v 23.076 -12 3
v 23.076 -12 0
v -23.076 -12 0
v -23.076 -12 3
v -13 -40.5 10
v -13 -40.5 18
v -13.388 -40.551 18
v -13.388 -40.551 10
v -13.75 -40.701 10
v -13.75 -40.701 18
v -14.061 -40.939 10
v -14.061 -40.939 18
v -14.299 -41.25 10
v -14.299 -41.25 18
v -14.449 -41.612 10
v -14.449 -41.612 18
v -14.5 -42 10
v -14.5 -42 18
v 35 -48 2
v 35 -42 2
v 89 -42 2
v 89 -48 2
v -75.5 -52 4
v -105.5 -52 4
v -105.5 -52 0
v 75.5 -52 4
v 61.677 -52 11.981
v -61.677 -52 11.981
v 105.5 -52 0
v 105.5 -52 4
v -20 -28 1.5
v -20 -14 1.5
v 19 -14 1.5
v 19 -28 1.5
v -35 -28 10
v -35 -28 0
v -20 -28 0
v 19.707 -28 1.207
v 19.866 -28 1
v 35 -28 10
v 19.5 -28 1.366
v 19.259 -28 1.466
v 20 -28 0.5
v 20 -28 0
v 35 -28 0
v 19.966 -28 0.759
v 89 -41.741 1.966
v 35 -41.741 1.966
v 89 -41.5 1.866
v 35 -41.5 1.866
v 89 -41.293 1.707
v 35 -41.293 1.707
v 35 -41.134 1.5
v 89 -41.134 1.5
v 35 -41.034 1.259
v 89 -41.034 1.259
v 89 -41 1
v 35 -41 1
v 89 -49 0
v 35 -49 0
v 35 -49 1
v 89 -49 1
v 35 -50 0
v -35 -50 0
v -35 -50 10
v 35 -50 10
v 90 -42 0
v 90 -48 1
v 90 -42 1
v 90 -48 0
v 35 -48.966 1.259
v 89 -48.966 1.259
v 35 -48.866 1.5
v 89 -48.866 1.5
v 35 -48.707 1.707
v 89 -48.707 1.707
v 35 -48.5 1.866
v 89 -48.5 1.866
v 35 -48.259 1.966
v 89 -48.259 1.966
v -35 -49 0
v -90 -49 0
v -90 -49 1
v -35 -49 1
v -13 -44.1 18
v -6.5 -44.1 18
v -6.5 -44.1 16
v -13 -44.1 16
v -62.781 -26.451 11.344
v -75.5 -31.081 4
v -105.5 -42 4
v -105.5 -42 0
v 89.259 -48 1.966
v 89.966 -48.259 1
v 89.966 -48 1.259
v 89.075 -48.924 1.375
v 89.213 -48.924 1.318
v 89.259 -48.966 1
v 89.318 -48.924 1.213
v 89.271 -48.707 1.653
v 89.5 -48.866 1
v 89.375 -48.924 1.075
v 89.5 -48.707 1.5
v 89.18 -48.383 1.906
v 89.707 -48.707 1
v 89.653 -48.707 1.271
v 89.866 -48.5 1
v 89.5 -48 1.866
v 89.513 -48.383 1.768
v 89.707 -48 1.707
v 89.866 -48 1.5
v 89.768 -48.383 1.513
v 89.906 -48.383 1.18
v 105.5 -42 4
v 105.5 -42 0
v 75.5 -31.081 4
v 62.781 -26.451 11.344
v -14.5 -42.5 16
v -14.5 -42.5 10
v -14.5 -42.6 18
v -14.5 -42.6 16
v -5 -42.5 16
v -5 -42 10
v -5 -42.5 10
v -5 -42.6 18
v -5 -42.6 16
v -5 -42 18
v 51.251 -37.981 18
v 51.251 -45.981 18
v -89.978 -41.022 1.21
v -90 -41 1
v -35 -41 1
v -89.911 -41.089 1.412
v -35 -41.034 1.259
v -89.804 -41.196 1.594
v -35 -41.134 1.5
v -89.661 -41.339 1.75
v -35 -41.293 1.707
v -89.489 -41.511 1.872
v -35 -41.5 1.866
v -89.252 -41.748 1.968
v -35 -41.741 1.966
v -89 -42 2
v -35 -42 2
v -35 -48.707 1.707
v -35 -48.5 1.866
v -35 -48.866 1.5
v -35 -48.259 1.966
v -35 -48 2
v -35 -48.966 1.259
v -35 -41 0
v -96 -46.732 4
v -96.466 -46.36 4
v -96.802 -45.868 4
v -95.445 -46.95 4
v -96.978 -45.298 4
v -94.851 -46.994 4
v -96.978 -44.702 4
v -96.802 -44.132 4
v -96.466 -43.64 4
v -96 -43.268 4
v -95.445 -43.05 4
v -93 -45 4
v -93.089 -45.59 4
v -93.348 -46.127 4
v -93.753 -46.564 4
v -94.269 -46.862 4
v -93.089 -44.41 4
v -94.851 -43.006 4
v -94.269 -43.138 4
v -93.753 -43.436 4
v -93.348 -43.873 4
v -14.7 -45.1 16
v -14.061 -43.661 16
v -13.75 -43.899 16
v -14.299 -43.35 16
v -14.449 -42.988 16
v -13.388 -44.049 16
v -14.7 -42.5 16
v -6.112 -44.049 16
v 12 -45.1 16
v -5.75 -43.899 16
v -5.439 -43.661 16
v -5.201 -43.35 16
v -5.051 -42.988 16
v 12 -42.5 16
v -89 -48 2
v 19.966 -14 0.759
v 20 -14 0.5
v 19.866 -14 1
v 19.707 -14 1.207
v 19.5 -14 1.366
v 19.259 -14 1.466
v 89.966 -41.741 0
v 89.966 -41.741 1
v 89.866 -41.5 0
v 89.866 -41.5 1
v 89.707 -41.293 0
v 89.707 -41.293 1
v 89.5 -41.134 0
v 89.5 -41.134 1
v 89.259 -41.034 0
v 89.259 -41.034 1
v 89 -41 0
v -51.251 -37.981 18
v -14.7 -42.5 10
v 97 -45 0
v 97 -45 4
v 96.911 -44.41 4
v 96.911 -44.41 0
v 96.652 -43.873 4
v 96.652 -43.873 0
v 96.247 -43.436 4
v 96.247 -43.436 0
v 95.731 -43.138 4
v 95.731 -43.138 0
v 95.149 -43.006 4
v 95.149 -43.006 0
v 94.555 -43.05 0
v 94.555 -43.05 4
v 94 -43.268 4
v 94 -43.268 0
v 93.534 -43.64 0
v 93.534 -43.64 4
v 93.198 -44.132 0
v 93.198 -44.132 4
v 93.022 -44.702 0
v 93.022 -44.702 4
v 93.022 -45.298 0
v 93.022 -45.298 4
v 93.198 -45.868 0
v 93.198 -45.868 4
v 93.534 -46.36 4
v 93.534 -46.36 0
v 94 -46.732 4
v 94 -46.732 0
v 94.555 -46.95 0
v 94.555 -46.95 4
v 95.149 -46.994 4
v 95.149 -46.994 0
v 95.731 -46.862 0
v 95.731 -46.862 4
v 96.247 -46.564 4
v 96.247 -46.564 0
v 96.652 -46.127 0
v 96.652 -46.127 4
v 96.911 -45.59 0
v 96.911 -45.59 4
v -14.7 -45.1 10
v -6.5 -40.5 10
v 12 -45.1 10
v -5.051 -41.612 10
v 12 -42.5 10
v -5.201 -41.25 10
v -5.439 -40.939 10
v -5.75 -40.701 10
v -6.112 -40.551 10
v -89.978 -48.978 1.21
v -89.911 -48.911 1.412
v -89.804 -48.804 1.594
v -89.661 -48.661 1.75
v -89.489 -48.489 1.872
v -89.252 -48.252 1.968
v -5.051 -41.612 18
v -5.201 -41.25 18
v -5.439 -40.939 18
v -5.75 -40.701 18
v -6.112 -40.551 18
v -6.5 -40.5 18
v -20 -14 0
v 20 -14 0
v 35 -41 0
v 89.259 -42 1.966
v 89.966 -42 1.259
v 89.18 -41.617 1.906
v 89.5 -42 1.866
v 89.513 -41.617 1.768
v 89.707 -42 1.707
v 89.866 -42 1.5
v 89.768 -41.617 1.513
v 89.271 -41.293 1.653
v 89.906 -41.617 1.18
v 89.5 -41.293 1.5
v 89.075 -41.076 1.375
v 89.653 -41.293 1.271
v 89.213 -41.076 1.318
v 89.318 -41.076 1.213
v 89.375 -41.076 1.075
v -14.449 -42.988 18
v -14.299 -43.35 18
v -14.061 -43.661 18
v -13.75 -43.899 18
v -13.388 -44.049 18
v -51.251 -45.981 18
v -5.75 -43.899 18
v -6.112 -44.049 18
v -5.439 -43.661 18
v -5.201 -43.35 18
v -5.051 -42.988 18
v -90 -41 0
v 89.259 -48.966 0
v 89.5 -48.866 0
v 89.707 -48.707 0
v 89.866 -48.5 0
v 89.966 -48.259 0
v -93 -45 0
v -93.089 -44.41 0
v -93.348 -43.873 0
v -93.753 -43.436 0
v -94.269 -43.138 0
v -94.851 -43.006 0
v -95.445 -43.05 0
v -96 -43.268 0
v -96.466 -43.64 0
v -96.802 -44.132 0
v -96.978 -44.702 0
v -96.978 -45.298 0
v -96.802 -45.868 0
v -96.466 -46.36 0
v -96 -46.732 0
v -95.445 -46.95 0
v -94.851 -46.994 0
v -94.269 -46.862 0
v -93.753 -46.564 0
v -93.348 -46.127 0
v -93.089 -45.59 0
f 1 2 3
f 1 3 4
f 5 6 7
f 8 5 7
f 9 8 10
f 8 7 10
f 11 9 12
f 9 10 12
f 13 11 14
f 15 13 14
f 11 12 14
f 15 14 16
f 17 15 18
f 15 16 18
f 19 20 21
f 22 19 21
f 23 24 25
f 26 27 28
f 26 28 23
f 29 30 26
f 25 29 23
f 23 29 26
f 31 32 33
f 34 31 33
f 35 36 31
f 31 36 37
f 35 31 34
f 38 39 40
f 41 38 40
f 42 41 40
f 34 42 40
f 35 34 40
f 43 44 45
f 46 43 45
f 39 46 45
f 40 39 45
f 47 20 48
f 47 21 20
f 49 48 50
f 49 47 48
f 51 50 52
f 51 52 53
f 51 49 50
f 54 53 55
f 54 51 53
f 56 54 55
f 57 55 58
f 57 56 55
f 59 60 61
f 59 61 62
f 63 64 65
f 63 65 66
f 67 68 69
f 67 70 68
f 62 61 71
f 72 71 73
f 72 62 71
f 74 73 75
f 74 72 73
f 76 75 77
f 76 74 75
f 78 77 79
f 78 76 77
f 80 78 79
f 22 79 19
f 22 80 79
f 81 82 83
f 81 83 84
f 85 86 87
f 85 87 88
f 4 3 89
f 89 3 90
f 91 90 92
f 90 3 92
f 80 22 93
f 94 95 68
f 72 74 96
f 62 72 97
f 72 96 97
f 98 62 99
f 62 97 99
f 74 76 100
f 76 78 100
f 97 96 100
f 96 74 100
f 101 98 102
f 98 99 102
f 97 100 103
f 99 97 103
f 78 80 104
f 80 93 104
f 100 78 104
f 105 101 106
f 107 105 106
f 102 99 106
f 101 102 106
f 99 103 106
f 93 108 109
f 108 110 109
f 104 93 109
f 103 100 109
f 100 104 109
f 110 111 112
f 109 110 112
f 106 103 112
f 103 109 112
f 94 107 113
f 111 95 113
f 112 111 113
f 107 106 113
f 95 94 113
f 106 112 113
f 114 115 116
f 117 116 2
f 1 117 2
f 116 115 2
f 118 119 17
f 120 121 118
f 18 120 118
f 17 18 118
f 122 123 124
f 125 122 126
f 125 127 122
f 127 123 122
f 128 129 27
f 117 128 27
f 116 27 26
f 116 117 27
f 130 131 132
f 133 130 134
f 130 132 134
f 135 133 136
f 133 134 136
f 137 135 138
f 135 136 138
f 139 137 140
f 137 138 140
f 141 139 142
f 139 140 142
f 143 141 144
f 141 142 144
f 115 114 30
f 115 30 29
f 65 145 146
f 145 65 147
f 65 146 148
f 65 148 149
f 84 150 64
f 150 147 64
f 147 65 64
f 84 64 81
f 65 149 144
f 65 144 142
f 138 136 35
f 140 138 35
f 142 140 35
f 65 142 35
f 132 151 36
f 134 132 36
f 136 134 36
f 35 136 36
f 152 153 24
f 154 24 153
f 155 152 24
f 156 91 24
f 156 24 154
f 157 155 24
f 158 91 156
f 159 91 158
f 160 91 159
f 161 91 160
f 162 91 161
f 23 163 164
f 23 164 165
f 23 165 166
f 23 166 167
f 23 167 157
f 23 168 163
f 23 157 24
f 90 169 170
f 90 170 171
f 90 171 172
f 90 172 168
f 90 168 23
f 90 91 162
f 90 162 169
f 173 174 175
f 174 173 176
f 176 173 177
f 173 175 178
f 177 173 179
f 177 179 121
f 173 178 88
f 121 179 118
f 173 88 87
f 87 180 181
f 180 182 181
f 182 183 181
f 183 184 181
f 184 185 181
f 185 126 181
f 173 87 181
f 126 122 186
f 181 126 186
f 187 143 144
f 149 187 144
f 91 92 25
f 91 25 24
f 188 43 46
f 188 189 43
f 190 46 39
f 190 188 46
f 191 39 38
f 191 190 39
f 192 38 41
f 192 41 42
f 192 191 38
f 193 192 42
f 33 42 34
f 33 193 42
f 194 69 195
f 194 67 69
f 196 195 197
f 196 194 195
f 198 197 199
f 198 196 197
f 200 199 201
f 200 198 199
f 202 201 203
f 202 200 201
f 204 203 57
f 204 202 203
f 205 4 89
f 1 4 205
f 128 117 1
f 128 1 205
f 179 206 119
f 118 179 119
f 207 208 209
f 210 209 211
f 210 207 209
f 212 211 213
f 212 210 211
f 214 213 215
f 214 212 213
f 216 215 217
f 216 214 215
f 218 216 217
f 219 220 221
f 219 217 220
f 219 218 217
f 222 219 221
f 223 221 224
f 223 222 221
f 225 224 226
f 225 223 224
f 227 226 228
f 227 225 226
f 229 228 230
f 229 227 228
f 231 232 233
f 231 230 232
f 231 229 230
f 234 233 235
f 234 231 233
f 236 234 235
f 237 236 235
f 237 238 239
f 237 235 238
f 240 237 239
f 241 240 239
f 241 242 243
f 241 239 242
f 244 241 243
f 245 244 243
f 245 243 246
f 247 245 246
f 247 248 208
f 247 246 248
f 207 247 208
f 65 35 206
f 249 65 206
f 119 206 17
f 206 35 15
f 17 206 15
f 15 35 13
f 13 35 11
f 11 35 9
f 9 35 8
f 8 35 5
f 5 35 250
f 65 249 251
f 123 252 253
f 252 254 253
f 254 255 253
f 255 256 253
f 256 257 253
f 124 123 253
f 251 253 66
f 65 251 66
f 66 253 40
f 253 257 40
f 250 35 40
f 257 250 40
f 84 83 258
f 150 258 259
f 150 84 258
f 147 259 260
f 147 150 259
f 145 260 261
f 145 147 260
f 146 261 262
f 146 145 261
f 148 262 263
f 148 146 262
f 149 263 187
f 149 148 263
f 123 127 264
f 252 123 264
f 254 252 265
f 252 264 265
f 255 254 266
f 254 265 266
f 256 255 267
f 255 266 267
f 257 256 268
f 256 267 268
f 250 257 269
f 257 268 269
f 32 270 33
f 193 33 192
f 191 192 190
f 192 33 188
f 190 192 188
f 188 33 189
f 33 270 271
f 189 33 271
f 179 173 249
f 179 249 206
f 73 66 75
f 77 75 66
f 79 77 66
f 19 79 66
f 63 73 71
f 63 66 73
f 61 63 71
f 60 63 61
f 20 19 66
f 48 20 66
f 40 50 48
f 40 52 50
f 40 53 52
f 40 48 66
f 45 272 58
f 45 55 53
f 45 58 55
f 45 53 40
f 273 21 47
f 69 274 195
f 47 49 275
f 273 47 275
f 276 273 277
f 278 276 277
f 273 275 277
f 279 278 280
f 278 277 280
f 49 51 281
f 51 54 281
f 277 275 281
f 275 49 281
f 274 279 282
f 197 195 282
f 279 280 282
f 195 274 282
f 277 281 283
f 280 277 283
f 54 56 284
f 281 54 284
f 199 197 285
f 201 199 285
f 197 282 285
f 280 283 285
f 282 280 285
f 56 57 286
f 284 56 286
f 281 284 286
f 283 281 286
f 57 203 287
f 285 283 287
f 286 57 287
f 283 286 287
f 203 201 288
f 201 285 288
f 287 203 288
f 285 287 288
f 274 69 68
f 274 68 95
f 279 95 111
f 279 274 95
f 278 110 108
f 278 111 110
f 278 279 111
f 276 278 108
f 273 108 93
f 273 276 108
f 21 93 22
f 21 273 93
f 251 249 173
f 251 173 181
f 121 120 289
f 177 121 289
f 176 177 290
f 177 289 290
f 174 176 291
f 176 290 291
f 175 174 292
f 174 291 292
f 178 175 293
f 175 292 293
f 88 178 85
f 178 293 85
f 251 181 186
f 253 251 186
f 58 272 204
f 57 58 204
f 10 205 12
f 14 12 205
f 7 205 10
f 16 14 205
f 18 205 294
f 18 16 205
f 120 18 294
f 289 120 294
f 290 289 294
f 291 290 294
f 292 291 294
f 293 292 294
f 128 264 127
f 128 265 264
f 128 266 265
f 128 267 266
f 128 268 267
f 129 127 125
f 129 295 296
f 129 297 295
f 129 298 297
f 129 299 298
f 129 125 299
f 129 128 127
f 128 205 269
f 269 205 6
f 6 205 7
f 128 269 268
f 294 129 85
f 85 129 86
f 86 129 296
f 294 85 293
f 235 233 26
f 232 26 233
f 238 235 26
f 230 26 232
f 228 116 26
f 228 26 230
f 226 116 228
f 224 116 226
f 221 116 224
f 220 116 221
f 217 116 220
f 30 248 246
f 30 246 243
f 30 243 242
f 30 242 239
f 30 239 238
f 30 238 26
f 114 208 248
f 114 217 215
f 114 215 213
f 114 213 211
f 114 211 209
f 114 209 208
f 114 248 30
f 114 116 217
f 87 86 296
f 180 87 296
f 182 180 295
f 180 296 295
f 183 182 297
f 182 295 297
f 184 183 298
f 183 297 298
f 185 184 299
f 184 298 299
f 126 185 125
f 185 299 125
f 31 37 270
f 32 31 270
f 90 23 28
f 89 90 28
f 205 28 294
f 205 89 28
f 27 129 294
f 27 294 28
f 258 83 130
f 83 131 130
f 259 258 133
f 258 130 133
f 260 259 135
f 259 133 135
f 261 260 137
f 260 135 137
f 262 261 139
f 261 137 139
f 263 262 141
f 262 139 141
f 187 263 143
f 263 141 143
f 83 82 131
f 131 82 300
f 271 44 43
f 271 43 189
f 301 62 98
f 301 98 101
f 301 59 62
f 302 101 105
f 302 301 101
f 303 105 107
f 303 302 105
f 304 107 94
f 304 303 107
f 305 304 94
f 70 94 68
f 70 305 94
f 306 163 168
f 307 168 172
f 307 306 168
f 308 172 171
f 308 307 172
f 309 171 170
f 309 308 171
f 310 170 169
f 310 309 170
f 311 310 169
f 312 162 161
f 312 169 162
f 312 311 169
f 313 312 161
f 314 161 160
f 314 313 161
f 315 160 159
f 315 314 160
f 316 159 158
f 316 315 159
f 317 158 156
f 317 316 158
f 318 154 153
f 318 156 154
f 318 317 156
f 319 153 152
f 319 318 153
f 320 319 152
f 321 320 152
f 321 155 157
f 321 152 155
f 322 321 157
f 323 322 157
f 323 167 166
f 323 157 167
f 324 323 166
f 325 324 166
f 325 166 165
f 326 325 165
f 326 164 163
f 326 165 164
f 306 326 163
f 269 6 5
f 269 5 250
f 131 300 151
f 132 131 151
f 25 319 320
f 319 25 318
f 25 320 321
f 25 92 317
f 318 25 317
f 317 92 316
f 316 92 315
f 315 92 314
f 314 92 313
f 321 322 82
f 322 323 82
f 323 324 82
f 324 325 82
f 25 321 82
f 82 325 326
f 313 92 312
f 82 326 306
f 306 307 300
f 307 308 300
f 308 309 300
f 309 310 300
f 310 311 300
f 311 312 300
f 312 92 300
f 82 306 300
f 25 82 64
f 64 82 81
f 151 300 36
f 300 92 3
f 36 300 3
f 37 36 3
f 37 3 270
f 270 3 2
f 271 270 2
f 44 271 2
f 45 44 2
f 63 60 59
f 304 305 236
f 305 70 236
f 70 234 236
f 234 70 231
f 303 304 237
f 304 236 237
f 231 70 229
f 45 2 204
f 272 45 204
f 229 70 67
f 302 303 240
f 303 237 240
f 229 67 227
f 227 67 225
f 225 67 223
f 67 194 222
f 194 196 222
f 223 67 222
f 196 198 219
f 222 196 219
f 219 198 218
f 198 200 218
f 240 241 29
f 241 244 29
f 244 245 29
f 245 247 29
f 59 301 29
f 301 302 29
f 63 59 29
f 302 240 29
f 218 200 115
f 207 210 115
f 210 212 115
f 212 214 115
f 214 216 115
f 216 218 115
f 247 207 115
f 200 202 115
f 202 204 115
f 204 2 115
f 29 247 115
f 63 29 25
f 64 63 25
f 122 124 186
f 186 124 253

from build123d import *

# Parameters (mm, degrees)
SKETCH002_R       = 2
PAD_DEPTH         = 18
PAD001_DEPTH      = 100
SKETCH007_W       = 40
SKETCH007_H       = 36
PAD004_DEPTH      = 1.5
SKETCH008_W       = 70
SKETCH008_H       = 22
PAD005_DEPTH      = 10
SKETCH009_W       = 56
SKETCH009_H       = 8
PAD006_DEPTH      = 2
SKETCH010_W       = 26.7
SKETCH010_H       = 2.6
PAD007_DEPTH      = 15
PAD008_DEPTH      = 20
PAD008_DEPTH_BACK = 20
SKETCH013_W       = 56
SKETCH013_H       = 8
PAD009_DEPTH      = 2
PAD002_DEPTH      = 120
PAD002_DEPTH_BACK = 120
FILLET_R          = 1
FILLET001_R       = 1
FILLET002_R       = 1
FILLET003_R       = 1
FILLET004_R       = 1


with BuildPart() as body:
    # Sketch002 → Pad (new body)
    with BuildSketch(Plane.XY):
        Polygon((-105.5, -52), (105.5, -52), (105.5, -42), (23.075677, -12), (-23.075677, -12), (-105.5, -42), align=None)
        with Locations((-95, -45)):
            Circle(SKETCH002_R, mode=Mode.SUBTRACT)
        with Locations((95, -45)):
            Circle(SKETCH002_R, mode=Mode.SUBTRACT)
    extrude(amount=PAD_DEPTH)


with BuildPart() as body001:
    # Sketch → Pad001 (new body)
    with BuildSketch(Plane.XZ):
        Polygon((-105.5, 0), (-105.5, 4), (-75.5, 4), (-51.251289, 18), (51.251289, 18), (75.5, 4), (105.5, 4), (105.5, 0), align=None)
    extrude(amount=PAD001_DEPTH)

    # Boolean: intersect Body
    add(body.part, mode=Mode.INTERSECT)


with BuildPart() as body004:
    # Sketch007 → Pad004 (new body)
    with BuildSketch(Plane.XY):
        with Locations((0, -32)):
            Rectangle(SKETCH007_W, SKETCH007_H)
    extrude(amount=PAD004_DEPTH)


with BuildPart() as body005:
    # Sketch008 → Pad005 (new body)
    with BuildSketch(Plane.XY):
        with Locations((0, -39)):
            Rectangle(SKETCH008_W, SKETCH008_H)
    extrude(amount=PAD005_DEPTH)


with BuildPart() as body006:
    # Sketch009 → Pad006 (new body)
    with BuildSketch(Plane.XY):
        with Locations((62, -45)):
            Rectangle(SKETCH009_W, SKETCH009_H)
    extrude(amount=PAD006_DEPTH)


with BuildPart() as body007:
    # Sketch010 → Pad007 (new body)
    with BuildSketch(Plane.XY):
        with Locations((-1.35, -40.3)):
            Rectangle(SKETCH010_W, SKETCH010_H)
    extrude(amount=PAD007_DEPTH)


with BuildPart() as body007_1:
    # Body007 placement: moved
    add(body007.part.moved(Location((0, -3.5, 1))))


with BuildPart() as body008:
    # Sketch011 → Pad008 (new body, two sides)
    with BuildSketch(Plane.XY) as pad008_sk:
        with BuildLine():
            ThreePointArc((-13, -37), (-14.06066, -37.43934), (-14.5, -38.5))
            Line((-14.5, -39.1), (-14.5, -38.5))
            ThreePointArc((-14.5, -39.1), (-14.06066, -40.16066), (-13, -40.6))
            Line((-6.5, -40.6), (-13, -40.6))
            ThreePointArc((-6.5, -40.6), (-5.43934, -40.16066), (-5, -39.1))
            Line((-5, -38.5), (-5, -39.1))
            ThreePointArc((-5, -38.5), (-5.43934, -37.43934), (-6.5, -37))
            Line((-13, -37), (-6.5, -37))
        make_face()
    extrude(amount=PAD008_DEPTH)
    extrude(pad008_sk.sketch, amount=-PAD008_DEPTH_BACK)


with BuildPart() as body008_1:
    # Body008 placement: moved
    add(body008.part.moved(Location((0, -3.5, 11))))


with BuildPart() as body009:
    # Sketch013 → Pad009 (new body)
    with BuildSketch(Plane.XY):
        with Locations((-62, -45)):
            Rectangle(SKETCH013_W, SKETCH013_H)
    extrude(amount=PAD009_DEPTH)


with BuildPart() as back:
    # Sketch003 → Pad002 (new body, two sides)
    with BuildSketch(Plane.YZ) as pad002_sk:
        Polygon((-12, 0), (-12, 3), (-37.980762, 18), (-45.980762, 18), (-52, 11.980762), (-52, 0), align=None)
    extrude(amount=PAD002_DEPTH)
    extrude(pad002_sk.sketch, amount=-PAD002_DEPTH_BACK)

    # Boolean001: intersect Body001
    add(body001.part, mode=Mode.INTERSECT)

    # Boolean002: cut Body004
    add(body004.part, mode=Mode.SUBTRACT)

    # Boolean003: cut Body005
    add(body005.part, mode=Mode.SUBTRACT)

    # Boolean004: cut Body006
    add(body006.part, mode=Mode.SUBTRACT)

    # Boolean005: cut Body007
    add(body007_1.part, mode=Mode.SUBTRACT)

    # Boolean006: cut Body008
    add(body008_1.part, mode=Mode.SUBTRACT)

    # Fillet
    fillet_edges = [back.edges().sort_by_distance(p)[0] for p in [
        (20, -21, 1.5),
    ]]
    fillet(fillet_edges, radius=FILLET_R)

    # Fillet001
    fillet001_edges = [back.edges().sort_by_distance(p)[0] for p in [
        (90, -45, 2),
    ]]
    fillet(fillet001_edges, radius=FILLET001_R)

    # Fillet002
    fillet002_edges = [back.edges().sort_by_distance(p)[0] for p in [
        (62, -41, 2),
    ]]
    fillet(fillet002_edges, radius=FILLET002_R)

    # Fillet003
    fillet003_edges = [back.edges().sort_by_distance(p)[0] for p in [
        (62, -49, 2),
    ]]
    fillet(fillet003_edges, radius=FILLET003_R)

    # Boolean007: cut Body009
    add(body009.part, mode=Mode.SUBTRACT)

    # Fillet004
    fillet004_edges = [back.edges().sort_by_distance(p)[0] for p in [
        (-62.5, -41, 2),
        (-62.5, -49, 2),
        (-90, -45, 2),
    ]]
    fillet(fillet004_edges, radius=FILLET004_R)


solid = back.part
